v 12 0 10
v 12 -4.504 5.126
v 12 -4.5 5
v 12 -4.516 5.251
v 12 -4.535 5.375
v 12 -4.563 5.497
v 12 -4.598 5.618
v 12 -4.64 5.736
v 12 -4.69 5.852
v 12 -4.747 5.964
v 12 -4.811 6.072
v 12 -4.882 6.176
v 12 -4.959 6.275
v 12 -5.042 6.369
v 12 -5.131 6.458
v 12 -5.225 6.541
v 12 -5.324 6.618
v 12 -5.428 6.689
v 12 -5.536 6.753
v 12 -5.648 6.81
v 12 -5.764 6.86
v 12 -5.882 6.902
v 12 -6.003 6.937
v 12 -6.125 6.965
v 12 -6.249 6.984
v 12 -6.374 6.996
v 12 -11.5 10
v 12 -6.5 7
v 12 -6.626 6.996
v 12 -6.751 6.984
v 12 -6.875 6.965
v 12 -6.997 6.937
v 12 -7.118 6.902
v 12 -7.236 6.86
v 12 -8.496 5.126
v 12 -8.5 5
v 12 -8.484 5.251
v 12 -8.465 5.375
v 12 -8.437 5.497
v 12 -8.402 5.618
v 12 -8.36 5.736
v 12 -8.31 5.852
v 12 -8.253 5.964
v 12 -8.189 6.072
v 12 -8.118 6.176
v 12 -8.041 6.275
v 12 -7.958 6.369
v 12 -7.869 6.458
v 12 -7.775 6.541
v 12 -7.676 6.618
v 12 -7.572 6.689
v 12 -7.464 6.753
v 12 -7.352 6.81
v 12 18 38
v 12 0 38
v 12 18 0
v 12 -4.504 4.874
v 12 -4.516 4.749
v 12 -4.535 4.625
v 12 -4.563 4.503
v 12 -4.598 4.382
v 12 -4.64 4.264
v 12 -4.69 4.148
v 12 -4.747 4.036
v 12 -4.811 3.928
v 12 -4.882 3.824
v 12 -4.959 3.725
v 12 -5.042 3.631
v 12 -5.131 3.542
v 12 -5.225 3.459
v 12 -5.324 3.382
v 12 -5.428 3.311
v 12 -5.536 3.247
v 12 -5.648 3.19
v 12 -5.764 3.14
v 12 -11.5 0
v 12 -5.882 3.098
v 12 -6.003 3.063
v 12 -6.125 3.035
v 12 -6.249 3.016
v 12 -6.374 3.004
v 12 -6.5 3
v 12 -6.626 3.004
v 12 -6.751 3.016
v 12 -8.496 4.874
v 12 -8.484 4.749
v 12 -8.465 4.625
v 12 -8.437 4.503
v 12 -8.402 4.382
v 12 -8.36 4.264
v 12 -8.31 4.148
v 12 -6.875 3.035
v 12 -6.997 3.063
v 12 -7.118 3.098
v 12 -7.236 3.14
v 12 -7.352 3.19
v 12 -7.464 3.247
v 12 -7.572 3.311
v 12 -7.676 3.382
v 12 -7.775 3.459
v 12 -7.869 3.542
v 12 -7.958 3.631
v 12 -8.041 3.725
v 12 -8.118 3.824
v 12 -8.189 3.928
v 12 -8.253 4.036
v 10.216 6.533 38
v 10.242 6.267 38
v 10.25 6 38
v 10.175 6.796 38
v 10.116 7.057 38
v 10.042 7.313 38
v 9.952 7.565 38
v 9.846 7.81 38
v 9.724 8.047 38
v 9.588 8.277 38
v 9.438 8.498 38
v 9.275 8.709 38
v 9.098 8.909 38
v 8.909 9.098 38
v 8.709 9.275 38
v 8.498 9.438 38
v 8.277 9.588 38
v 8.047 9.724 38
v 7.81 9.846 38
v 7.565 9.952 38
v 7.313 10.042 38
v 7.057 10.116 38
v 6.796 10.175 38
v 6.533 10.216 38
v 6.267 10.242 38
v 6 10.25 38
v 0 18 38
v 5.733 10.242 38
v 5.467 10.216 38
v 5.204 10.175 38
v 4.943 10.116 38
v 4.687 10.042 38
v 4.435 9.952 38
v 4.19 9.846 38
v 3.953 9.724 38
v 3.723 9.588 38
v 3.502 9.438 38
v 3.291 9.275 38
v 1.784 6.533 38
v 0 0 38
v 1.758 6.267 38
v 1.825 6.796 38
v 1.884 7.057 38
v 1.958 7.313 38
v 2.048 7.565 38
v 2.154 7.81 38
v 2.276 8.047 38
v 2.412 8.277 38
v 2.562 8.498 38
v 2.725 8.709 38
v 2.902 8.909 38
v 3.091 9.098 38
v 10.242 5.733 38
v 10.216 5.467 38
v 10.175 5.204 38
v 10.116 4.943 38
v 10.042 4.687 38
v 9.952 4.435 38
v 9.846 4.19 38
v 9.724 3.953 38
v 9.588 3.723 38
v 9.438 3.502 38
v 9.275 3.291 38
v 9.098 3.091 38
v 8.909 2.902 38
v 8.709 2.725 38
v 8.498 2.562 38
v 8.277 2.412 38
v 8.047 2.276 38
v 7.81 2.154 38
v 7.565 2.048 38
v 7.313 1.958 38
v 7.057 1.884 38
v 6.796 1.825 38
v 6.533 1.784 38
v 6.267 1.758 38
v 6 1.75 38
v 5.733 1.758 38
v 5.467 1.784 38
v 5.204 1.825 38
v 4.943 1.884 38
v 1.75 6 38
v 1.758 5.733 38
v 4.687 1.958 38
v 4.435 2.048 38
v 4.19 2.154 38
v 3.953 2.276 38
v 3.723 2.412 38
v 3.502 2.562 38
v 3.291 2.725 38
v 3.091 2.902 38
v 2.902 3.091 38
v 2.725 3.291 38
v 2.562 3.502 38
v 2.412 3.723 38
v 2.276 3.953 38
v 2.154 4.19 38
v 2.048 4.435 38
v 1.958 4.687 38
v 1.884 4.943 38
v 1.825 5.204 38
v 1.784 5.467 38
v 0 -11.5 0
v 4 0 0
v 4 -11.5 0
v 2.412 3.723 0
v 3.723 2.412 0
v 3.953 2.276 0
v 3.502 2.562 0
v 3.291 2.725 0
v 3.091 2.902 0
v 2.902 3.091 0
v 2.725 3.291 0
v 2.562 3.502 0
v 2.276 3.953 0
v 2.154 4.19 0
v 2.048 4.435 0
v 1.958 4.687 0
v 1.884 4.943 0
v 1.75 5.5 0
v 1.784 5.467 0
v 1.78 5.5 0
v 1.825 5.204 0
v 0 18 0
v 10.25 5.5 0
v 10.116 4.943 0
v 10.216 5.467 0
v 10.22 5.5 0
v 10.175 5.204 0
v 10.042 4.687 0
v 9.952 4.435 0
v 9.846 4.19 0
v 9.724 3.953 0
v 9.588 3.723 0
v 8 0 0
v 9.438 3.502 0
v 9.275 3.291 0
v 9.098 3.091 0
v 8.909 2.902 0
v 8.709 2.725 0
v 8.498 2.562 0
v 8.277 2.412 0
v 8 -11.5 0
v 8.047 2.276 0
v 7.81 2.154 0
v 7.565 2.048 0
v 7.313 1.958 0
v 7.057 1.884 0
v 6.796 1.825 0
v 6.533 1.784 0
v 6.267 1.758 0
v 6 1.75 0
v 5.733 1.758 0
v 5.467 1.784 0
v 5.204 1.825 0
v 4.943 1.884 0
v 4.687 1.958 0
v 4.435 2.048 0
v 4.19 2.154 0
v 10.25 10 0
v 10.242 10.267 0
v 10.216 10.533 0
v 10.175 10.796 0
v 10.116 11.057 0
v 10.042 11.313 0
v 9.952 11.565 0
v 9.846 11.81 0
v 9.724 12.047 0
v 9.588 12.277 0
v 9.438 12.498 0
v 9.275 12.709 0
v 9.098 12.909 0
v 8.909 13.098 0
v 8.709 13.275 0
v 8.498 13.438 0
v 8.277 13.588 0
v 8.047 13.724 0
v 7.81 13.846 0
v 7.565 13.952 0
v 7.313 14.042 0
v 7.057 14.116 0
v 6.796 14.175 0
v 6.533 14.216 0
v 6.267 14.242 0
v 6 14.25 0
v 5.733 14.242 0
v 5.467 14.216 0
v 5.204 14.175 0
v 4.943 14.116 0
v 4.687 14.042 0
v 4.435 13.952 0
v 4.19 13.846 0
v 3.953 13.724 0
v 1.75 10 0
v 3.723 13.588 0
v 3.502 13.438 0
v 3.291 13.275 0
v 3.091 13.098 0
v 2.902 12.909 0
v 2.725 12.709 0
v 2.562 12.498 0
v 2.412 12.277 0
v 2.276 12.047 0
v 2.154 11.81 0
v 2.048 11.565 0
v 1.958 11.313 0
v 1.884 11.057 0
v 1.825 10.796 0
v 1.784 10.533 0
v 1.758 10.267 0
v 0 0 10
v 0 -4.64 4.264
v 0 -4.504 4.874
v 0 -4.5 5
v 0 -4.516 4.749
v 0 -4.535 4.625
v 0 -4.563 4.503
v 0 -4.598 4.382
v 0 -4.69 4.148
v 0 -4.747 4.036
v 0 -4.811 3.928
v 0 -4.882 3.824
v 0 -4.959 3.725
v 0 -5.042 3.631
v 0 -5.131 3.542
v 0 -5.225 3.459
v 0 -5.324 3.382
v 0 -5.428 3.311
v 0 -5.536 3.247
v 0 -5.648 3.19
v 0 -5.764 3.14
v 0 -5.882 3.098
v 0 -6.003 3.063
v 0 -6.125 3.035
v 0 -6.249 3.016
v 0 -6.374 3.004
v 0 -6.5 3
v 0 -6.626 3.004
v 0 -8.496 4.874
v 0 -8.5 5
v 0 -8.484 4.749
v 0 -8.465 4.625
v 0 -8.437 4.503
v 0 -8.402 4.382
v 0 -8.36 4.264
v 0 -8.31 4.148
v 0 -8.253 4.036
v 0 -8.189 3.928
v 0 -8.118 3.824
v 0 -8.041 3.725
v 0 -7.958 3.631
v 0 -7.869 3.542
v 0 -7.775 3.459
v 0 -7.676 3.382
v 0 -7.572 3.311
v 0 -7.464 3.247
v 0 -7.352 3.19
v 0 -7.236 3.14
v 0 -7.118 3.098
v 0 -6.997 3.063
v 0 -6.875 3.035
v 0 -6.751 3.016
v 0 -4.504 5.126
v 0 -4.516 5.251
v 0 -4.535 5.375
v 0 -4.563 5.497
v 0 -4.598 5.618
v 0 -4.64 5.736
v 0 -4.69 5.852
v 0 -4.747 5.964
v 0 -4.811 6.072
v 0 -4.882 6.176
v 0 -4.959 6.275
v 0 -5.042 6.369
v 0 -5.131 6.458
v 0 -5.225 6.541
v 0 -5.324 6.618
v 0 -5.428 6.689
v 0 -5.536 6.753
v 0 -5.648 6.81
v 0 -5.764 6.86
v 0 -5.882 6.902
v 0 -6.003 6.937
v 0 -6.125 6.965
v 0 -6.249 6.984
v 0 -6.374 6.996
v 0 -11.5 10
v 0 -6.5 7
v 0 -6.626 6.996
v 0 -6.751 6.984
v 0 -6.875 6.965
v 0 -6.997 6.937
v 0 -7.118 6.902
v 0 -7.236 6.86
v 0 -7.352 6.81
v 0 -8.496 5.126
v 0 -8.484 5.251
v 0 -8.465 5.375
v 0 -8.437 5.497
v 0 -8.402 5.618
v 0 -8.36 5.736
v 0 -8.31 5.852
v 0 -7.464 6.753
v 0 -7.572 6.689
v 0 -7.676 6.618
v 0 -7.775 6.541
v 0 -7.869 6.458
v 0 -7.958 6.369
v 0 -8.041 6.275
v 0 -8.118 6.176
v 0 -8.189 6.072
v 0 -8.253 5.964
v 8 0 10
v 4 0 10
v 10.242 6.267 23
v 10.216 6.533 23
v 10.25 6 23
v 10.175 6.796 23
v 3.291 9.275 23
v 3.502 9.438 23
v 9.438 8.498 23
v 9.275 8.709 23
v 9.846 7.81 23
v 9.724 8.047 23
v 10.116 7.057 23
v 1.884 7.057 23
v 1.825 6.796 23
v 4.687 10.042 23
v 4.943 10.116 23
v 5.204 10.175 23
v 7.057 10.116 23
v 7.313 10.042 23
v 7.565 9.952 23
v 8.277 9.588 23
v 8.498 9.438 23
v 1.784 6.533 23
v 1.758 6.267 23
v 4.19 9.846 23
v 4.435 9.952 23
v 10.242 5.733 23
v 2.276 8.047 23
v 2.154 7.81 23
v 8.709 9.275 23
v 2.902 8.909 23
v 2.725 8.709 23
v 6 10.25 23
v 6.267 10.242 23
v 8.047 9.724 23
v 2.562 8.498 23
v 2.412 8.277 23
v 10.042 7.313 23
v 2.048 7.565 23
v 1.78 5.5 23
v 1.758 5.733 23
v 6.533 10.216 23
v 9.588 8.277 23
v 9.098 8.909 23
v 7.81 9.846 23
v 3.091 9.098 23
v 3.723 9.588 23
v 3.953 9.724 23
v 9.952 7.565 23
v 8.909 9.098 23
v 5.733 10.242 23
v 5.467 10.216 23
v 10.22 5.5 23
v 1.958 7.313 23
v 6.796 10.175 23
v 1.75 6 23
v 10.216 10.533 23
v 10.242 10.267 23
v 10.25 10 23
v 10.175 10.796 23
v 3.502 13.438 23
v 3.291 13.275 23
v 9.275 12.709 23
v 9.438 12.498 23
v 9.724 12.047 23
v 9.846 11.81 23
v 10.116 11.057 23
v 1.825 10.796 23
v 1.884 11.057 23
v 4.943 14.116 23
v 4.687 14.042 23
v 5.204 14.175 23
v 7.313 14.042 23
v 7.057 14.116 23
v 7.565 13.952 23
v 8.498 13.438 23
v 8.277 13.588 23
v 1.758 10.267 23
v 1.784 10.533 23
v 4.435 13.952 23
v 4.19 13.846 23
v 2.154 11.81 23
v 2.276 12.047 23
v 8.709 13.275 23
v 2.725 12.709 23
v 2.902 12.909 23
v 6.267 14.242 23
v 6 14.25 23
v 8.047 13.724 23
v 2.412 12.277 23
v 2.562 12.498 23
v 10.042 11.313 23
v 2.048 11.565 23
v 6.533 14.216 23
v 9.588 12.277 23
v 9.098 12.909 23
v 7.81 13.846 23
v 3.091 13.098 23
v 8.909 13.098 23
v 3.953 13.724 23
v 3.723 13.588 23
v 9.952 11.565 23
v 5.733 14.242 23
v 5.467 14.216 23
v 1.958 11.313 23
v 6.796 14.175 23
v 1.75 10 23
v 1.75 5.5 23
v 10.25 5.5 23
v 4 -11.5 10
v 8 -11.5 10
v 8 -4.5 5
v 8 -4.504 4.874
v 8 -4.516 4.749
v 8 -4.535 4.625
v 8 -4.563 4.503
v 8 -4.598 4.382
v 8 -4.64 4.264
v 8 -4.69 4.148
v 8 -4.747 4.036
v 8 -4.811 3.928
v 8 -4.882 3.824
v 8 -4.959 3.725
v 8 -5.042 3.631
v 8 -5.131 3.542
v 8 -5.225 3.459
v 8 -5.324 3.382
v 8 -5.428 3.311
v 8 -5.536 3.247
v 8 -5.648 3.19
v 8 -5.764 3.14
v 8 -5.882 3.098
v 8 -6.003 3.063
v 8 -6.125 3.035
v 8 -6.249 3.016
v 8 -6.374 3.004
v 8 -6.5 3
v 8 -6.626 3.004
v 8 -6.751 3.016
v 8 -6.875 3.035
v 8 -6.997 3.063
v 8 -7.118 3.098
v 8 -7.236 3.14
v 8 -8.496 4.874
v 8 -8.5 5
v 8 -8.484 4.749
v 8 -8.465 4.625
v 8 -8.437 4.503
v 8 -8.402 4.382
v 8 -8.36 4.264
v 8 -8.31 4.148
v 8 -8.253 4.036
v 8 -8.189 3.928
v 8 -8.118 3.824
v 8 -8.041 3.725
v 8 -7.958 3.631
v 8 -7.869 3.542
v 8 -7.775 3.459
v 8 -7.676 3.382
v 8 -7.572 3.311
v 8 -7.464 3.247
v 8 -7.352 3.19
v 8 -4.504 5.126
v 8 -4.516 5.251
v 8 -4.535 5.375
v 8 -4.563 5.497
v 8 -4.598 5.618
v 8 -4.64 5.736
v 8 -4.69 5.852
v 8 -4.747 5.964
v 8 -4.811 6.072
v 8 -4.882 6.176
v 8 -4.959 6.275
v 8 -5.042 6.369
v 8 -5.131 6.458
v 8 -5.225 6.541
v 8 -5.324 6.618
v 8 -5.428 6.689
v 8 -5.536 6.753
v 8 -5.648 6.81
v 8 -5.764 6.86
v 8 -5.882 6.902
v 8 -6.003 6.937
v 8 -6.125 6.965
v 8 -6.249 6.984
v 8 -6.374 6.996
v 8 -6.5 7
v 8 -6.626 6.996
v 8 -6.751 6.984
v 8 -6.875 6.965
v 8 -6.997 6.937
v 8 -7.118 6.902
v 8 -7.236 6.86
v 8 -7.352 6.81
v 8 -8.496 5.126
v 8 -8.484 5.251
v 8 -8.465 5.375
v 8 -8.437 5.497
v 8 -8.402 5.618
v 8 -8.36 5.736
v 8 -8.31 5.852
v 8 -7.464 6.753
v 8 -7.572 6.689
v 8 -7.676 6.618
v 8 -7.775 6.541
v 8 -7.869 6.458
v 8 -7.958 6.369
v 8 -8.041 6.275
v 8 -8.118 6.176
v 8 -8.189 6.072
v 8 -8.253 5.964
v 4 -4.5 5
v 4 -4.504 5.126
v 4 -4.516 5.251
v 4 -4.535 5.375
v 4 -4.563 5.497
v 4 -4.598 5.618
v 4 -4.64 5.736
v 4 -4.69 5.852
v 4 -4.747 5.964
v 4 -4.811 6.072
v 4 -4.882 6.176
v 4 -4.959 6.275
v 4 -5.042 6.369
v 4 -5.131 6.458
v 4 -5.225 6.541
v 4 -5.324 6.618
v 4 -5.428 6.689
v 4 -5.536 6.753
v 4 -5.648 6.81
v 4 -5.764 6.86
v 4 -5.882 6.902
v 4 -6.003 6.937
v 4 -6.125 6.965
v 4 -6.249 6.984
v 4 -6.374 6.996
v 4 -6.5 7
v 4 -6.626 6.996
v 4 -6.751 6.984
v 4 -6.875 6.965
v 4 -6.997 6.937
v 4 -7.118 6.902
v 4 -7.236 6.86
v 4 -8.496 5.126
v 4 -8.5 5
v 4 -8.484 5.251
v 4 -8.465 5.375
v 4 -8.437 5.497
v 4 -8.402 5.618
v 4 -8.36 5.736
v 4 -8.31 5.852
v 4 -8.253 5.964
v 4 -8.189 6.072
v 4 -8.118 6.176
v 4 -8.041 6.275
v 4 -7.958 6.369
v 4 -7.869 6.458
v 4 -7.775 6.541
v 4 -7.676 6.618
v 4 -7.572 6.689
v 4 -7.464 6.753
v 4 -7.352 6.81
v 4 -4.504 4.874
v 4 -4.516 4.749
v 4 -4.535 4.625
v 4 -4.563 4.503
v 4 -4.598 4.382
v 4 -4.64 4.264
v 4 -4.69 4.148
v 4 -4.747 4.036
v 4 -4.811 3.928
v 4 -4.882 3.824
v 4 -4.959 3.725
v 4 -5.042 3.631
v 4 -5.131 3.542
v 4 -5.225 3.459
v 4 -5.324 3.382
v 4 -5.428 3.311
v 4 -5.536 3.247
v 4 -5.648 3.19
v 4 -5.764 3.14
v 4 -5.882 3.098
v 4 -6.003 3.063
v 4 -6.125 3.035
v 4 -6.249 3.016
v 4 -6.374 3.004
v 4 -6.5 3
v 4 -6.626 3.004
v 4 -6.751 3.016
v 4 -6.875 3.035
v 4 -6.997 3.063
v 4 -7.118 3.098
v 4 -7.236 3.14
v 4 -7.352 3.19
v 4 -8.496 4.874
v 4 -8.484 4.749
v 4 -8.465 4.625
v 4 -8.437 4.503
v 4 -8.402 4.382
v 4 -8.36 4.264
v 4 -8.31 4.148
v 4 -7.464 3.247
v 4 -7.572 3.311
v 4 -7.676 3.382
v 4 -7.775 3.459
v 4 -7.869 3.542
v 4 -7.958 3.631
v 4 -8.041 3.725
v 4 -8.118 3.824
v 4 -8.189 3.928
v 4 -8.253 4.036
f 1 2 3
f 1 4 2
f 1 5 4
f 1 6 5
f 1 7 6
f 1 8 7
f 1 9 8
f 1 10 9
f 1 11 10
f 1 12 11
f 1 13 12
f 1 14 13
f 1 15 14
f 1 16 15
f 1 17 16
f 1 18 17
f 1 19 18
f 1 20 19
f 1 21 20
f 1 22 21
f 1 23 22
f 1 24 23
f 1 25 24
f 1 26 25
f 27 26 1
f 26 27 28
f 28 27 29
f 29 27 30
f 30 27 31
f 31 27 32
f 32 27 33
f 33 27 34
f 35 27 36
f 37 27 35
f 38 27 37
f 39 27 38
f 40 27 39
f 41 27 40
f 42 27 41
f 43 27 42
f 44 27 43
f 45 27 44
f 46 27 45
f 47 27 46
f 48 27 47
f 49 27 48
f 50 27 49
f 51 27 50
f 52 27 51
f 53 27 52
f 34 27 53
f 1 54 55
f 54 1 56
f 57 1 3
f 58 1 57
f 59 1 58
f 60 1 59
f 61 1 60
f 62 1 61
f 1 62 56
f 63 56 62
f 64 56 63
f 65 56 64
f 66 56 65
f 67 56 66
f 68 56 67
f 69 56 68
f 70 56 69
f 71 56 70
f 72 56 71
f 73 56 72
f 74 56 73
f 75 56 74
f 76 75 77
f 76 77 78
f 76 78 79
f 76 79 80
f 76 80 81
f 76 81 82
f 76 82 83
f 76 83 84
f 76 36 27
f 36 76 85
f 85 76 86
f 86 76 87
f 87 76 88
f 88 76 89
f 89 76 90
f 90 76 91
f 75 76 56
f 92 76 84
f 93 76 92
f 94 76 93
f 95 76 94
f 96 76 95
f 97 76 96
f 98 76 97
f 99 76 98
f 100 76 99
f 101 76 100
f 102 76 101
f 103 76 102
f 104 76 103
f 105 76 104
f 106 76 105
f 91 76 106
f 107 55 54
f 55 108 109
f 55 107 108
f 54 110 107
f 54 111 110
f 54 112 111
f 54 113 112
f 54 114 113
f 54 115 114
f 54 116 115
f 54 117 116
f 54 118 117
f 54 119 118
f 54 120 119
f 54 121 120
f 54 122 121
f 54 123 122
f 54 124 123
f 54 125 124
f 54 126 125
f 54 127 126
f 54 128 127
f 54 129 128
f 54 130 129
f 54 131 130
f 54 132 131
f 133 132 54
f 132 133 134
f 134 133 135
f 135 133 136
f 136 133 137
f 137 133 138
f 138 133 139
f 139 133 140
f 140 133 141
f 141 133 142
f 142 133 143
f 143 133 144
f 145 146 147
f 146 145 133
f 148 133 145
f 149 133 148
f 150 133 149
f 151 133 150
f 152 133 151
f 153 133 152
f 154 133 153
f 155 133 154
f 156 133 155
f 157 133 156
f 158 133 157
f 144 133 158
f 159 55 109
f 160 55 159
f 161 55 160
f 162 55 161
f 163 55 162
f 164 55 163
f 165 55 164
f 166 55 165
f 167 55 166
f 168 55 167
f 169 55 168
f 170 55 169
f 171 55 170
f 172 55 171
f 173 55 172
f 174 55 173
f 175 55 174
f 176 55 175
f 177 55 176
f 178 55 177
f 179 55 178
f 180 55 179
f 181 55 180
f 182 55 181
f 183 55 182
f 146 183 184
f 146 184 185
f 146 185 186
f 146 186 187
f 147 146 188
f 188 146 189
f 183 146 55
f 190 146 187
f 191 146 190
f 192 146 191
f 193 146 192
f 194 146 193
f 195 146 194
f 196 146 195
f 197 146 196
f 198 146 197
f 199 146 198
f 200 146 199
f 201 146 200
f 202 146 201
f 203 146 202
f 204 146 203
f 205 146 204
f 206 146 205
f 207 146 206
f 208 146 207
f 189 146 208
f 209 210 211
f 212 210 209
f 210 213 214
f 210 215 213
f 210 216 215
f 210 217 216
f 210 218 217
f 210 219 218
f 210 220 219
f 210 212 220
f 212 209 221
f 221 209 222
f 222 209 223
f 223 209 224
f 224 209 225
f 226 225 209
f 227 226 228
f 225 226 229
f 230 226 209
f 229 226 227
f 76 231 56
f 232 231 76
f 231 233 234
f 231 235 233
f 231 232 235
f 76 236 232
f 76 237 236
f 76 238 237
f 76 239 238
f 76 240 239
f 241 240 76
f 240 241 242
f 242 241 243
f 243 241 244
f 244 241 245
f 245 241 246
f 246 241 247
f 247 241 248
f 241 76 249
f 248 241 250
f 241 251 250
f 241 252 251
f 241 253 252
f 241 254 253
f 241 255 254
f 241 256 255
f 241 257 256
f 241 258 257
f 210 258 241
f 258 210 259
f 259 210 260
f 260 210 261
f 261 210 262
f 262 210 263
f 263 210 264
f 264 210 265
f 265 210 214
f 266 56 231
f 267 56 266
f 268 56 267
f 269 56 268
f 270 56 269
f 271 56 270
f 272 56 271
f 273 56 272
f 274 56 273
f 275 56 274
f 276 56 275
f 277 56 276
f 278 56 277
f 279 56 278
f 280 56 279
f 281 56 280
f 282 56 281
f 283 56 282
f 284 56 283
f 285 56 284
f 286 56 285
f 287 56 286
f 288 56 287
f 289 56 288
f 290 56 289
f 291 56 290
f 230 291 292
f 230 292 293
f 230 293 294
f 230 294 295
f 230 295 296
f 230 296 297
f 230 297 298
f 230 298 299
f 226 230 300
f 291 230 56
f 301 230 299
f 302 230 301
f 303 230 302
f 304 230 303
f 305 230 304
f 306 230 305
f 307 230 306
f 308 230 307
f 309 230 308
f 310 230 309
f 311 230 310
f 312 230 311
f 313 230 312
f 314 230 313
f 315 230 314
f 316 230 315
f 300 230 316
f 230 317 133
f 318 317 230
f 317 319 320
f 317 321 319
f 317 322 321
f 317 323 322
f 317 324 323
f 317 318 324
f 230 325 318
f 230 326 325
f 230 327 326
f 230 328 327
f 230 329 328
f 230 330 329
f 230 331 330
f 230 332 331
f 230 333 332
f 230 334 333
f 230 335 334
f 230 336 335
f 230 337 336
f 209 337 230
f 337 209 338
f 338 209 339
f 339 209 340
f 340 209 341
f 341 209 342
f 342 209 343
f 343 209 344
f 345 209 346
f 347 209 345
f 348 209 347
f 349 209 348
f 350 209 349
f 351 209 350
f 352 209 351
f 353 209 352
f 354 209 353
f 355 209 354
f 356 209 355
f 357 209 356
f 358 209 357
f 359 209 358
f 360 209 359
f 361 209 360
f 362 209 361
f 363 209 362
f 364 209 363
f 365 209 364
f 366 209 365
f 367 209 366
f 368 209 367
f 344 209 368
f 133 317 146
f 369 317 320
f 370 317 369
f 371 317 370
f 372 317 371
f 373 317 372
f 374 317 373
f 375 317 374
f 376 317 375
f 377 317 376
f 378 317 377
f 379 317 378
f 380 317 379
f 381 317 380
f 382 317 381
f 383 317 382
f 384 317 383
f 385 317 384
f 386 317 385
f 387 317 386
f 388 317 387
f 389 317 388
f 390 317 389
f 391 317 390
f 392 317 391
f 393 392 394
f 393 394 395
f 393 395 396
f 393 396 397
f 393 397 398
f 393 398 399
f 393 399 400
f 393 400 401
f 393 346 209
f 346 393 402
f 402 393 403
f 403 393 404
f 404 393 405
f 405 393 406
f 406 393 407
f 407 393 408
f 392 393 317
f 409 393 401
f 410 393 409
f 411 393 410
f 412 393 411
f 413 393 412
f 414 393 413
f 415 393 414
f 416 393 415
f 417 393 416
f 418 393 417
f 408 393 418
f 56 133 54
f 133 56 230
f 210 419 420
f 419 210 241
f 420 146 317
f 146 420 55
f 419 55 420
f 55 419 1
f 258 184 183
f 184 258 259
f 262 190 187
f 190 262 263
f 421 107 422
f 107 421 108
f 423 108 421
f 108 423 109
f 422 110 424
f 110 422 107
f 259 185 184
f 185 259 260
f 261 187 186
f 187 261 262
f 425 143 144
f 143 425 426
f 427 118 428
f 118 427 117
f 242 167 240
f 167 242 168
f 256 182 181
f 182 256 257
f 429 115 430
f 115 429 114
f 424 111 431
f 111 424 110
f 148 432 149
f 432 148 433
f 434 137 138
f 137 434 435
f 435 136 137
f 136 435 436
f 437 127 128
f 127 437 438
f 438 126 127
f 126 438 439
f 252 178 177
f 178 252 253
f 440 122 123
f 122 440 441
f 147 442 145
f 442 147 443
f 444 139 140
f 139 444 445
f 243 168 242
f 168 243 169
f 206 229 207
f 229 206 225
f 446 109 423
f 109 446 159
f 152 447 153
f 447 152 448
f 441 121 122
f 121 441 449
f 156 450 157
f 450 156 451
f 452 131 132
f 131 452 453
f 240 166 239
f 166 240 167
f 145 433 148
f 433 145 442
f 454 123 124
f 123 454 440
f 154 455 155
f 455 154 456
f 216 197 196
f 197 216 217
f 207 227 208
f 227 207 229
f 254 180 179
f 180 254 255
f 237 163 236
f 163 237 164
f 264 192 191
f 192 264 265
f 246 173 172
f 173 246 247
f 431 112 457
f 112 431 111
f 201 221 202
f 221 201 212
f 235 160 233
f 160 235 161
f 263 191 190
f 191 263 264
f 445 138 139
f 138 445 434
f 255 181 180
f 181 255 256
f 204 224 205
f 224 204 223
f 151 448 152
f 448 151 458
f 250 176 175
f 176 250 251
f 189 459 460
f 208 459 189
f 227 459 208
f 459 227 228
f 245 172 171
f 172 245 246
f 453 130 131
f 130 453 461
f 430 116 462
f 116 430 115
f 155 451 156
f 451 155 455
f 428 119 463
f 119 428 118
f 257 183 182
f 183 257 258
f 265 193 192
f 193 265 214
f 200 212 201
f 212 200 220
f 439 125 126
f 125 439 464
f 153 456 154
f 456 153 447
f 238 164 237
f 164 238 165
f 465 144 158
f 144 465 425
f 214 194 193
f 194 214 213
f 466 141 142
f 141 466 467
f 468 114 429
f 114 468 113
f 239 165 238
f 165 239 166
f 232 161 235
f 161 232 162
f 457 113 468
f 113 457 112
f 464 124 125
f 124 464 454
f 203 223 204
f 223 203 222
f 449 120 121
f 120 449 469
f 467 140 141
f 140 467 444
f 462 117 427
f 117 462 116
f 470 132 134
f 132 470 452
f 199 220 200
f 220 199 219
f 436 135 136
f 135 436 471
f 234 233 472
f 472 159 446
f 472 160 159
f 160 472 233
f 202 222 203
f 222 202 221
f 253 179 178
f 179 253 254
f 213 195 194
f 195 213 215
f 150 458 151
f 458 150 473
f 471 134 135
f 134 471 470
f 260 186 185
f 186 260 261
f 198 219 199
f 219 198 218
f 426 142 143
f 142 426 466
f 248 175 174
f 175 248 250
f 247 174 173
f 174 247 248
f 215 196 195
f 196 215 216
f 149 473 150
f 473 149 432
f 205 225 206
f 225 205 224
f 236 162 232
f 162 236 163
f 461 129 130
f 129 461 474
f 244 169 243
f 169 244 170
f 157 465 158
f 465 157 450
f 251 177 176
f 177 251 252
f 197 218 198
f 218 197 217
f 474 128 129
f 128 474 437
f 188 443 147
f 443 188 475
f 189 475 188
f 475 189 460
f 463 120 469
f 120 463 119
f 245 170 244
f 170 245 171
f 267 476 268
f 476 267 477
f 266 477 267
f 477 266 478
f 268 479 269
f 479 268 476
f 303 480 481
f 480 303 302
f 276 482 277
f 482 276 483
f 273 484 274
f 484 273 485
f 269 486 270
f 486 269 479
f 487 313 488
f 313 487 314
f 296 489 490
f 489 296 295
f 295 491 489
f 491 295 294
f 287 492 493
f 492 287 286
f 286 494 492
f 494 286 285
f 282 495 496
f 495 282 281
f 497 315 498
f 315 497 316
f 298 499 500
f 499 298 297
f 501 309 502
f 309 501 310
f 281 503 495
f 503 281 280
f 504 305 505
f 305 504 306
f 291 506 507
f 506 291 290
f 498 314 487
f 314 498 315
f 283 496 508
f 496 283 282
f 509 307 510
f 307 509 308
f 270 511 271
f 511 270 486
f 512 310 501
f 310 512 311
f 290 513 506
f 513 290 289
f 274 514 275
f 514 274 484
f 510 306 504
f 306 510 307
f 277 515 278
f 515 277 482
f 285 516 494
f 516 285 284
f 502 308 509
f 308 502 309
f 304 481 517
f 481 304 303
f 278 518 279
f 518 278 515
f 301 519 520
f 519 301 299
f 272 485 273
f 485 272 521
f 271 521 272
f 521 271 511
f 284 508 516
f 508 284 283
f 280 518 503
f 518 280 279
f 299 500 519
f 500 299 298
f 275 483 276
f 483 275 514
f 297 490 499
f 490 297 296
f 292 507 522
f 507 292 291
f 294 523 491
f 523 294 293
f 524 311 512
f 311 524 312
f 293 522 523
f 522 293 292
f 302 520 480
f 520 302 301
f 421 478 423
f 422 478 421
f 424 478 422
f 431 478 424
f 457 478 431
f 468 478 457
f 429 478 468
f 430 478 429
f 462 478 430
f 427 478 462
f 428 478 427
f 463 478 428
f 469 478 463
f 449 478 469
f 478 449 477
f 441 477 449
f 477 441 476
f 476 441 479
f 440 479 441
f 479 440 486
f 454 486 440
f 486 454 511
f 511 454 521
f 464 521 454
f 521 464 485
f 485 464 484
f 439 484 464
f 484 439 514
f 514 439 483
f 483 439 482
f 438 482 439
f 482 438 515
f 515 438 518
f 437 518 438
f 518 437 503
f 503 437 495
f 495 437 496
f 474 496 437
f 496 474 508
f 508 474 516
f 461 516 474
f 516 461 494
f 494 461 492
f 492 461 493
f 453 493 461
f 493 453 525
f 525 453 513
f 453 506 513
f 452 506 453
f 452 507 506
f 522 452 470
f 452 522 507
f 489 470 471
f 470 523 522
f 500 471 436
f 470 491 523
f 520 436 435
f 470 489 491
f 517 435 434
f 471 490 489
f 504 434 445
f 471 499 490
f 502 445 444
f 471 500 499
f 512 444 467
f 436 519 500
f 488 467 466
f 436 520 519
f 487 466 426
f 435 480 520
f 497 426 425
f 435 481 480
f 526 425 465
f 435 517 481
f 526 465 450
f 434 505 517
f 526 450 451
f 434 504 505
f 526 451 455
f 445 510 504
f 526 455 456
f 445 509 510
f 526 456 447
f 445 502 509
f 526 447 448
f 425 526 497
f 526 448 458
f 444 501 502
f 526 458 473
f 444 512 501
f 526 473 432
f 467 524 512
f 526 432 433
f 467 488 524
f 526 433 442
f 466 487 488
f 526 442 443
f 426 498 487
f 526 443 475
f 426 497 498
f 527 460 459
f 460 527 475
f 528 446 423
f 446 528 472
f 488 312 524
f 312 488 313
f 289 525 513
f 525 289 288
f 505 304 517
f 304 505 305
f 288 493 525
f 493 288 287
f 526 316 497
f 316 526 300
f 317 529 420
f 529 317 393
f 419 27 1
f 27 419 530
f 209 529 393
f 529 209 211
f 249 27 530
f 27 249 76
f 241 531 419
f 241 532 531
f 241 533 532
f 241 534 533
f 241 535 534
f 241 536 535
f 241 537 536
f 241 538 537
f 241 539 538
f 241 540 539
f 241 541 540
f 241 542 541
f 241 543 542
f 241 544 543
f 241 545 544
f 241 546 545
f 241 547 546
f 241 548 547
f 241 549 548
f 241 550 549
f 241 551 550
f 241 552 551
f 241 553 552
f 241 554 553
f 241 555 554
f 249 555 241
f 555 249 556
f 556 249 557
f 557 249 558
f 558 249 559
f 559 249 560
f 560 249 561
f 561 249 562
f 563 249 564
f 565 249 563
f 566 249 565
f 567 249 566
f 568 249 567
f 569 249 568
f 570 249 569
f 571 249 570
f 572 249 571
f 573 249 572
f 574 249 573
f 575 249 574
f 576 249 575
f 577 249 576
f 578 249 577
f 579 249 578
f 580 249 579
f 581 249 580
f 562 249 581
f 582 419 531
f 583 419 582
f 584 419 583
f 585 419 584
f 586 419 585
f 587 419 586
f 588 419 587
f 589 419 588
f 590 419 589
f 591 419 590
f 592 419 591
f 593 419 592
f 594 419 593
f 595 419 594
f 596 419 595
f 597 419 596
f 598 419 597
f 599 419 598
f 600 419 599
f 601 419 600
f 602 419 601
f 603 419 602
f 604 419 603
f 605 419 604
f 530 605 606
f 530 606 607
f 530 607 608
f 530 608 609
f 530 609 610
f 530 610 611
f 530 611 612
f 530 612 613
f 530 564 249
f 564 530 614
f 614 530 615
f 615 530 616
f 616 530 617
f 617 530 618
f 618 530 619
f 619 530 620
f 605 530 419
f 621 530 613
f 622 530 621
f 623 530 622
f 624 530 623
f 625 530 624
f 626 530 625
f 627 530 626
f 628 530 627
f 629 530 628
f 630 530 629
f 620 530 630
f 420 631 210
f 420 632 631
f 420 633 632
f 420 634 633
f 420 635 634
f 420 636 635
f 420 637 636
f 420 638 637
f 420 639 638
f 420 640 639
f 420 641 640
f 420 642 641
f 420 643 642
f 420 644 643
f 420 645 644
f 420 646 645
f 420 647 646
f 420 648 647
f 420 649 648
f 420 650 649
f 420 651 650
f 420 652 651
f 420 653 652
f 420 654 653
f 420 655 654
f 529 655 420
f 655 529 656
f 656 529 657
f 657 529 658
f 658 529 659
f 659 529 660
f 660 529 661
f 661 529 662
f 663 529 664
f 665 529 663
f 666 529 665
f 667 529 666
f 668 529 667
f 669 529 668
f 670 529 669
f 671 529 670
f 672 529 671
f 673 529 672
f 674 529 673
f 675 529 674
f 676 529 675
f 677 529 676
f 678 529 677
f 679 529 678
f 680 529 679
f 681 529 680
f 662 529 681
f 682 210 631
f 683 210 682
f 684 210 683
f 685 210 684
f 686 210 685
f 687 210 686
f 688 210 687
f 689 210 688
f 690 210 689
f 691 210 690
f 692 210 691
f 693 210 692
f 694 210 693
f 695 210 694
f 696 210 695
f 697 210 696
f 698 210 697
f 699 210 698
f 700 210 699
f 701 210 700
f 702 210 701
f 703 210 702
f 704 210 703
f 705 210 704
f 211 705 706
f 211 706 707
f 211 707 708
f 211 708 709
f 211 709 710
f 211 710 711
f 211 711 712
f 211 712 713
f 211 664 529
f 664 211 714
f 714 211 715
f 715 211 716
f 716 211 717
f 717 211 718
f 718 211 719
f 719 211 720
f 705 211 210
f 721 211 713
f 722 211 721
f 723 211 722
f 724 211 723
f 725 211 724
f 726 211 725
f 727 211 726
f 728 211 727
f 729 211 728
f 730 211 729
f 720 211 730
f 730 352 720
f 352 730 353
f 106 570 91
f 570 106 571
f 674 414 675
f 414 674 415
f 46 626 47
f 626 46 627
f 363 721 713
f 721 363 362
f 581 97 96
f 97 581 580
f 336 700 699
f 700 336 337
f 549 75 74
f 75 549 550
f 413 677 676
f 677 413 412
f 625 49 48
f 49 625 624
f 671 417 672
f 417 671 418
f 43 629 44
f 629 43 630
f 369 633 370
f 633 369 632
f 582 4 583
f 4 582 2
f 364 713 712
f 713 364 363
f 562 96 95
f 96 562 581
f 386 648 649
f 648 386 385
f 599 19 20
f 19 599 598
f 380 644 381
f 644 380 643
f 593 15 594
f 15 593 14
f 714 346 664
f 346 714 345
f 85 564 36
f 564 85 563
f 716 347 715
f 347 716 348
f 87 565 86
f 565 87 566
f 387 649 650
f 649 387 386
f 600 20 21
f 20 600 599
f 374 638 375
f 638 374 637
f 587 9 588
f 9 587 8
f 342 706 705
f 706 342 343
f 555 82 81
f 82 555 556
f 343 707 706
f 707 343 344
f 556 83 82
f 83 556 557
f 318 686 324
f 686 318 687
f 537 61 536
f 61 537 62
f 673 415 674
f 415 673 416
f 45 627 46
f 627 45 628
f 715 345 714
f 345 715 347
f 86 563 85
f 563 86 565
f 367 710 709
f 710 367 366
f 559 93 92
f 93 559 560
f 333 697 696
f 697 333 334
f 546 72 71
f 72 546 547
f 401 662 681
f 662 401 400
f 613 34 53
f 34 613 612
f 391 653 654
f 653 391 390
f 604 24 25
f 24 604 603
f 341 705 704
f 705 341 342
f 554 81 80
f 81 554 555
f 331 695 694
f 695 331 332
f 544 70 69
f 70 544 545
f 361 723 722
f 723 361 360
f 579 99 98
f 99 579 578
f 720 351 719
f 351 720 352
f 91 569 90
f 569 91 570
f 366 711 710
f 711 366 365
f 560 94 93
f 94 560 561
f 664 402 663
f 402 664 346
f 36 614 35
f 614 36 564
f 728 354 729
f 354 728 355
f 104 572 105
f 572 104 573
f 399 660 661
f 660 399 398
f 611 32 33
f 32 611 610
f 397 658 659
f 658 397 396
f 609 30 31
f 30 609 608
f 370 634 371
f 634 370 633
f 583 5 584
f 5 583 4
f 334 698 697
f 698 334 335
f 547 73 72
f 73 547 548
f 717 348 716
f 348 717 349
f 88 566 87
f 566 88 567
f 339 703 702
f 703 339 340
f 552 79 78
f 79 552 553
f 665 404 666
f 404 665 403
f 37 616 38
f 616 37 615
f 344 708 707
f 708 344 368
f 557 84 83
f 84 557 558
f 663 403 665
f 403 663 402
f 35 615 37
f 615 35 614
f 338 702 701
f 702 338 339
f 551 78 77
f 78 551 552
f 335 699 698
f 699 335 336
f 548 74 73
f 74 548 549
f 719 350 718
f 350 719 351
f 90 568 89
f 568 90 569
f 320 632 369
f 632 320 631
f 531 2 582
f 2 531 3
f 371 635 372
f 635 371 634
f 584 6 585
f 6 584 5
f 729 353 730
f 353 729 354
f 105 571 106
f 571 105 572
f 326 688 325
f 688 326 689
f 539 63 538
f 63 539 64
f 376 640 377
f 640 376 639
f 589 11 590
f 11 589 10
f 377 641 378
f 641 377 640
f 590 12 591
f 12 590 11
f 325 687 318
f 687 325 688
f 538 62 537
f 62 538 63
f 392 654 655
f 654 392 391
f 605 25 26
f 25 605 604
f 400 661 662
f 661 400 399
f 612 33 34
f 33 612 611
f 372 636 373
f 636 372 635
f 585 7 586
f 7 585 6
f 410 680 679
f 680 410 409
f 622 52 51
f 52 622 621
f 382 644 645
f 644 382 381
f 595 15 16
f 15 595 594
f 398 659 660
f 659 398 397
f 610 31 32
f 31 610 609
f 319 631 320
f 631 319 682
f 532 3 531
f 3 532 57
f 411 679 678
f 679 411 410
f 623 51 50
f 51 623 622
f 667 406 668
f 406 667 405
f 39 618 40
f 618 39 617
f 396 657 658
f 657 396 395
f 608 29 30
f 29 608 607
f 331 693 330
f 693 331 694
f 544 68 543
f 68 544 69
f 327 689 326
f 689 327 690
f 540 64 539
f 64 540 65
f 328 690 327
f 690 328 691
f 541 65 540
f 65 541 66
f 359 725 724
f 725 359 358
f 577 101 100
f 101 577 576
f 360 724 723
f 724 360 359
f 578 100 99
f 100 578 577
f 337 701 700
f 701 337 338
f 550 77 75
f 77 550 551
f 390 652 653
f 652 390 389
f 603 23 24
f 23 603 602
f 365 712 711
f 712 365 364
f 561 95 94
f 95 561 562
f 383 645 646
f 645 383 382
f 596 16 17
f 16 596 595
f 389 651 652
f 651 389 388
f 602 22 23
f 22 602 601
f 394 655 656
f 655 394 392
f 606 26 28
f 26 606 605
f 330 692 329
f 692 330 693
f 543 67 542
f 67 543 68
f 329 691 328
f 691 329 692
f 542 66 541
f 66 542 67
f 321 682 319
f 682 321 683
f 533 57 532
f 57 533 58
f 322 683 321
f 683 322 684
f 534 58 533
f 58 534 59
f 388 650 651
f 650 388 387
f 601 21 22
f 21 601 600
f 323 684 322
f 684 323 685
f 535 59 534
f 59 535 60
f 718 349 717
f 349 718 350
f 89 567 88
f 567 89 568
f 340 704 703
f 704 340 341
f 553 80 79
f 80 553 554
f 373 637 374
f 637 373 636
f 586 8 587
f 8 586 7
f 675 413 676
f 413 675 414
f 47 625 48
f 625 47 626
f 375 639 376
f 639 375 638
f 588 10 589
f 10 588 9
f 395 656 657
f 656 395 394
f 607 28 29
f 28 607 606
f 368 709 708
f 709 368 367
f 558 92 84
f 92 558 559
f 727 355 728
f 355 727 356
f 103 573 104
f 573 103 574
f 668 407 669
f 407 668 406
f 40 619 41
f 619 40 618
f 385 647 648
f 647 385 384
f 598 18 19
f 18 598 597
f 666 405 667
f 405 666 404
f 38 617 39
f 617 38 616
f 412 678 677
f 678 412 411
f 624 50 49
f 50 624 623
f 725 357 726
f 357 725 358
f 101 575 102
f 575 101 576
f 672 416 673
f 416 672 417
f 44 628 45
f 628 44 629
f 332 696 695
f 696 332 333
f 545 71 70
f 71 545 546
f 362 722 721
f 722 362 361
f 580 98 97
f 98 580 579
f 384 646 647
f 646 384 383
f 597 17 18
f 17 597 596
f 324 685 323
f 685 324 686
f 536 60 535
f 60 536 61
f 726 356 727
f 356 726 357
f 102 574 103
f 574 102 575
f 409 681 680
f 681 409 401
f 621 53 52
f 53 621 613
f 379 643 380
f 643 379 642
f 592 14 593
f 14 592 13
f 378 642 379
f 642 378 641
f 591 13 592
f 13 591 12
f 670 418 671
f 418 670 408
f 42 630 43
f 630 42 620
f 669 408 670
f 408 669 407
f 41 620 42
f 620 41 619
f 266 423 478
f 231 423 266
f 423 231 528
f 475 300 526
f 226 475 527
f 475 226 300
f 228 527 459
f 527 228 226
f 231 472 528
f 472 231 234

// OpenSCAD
$fn = 100;

module trzymak()
{
    difference()
    {
        cube([12, 18, 38]);
        translate([6, 6, -1])
        {
            cylinder(40, 4.25, 4.25);
        }
        translate([6, 10, -2])
        {
            cylinder(25, 4.25, 4.25);
        }
    }

    difference()
    {
        translate([0, -11.5, 0])
        {
            cube([12, 12, 10]);
        }
        translate([4, -13, -1])
        {
            cube([4, 13, 12]);
        }
        translate([-1, -6.5, 5])
        {
            rotate([0, 90, 0])
            {
                cylinder(15, 2, 2);
            }
        }
    }
}

difference()
{
    trzymak();
    translate([1.75, 5.5, -1])
    {
        cube([8.5, 4.5, 24]);
    }
}
